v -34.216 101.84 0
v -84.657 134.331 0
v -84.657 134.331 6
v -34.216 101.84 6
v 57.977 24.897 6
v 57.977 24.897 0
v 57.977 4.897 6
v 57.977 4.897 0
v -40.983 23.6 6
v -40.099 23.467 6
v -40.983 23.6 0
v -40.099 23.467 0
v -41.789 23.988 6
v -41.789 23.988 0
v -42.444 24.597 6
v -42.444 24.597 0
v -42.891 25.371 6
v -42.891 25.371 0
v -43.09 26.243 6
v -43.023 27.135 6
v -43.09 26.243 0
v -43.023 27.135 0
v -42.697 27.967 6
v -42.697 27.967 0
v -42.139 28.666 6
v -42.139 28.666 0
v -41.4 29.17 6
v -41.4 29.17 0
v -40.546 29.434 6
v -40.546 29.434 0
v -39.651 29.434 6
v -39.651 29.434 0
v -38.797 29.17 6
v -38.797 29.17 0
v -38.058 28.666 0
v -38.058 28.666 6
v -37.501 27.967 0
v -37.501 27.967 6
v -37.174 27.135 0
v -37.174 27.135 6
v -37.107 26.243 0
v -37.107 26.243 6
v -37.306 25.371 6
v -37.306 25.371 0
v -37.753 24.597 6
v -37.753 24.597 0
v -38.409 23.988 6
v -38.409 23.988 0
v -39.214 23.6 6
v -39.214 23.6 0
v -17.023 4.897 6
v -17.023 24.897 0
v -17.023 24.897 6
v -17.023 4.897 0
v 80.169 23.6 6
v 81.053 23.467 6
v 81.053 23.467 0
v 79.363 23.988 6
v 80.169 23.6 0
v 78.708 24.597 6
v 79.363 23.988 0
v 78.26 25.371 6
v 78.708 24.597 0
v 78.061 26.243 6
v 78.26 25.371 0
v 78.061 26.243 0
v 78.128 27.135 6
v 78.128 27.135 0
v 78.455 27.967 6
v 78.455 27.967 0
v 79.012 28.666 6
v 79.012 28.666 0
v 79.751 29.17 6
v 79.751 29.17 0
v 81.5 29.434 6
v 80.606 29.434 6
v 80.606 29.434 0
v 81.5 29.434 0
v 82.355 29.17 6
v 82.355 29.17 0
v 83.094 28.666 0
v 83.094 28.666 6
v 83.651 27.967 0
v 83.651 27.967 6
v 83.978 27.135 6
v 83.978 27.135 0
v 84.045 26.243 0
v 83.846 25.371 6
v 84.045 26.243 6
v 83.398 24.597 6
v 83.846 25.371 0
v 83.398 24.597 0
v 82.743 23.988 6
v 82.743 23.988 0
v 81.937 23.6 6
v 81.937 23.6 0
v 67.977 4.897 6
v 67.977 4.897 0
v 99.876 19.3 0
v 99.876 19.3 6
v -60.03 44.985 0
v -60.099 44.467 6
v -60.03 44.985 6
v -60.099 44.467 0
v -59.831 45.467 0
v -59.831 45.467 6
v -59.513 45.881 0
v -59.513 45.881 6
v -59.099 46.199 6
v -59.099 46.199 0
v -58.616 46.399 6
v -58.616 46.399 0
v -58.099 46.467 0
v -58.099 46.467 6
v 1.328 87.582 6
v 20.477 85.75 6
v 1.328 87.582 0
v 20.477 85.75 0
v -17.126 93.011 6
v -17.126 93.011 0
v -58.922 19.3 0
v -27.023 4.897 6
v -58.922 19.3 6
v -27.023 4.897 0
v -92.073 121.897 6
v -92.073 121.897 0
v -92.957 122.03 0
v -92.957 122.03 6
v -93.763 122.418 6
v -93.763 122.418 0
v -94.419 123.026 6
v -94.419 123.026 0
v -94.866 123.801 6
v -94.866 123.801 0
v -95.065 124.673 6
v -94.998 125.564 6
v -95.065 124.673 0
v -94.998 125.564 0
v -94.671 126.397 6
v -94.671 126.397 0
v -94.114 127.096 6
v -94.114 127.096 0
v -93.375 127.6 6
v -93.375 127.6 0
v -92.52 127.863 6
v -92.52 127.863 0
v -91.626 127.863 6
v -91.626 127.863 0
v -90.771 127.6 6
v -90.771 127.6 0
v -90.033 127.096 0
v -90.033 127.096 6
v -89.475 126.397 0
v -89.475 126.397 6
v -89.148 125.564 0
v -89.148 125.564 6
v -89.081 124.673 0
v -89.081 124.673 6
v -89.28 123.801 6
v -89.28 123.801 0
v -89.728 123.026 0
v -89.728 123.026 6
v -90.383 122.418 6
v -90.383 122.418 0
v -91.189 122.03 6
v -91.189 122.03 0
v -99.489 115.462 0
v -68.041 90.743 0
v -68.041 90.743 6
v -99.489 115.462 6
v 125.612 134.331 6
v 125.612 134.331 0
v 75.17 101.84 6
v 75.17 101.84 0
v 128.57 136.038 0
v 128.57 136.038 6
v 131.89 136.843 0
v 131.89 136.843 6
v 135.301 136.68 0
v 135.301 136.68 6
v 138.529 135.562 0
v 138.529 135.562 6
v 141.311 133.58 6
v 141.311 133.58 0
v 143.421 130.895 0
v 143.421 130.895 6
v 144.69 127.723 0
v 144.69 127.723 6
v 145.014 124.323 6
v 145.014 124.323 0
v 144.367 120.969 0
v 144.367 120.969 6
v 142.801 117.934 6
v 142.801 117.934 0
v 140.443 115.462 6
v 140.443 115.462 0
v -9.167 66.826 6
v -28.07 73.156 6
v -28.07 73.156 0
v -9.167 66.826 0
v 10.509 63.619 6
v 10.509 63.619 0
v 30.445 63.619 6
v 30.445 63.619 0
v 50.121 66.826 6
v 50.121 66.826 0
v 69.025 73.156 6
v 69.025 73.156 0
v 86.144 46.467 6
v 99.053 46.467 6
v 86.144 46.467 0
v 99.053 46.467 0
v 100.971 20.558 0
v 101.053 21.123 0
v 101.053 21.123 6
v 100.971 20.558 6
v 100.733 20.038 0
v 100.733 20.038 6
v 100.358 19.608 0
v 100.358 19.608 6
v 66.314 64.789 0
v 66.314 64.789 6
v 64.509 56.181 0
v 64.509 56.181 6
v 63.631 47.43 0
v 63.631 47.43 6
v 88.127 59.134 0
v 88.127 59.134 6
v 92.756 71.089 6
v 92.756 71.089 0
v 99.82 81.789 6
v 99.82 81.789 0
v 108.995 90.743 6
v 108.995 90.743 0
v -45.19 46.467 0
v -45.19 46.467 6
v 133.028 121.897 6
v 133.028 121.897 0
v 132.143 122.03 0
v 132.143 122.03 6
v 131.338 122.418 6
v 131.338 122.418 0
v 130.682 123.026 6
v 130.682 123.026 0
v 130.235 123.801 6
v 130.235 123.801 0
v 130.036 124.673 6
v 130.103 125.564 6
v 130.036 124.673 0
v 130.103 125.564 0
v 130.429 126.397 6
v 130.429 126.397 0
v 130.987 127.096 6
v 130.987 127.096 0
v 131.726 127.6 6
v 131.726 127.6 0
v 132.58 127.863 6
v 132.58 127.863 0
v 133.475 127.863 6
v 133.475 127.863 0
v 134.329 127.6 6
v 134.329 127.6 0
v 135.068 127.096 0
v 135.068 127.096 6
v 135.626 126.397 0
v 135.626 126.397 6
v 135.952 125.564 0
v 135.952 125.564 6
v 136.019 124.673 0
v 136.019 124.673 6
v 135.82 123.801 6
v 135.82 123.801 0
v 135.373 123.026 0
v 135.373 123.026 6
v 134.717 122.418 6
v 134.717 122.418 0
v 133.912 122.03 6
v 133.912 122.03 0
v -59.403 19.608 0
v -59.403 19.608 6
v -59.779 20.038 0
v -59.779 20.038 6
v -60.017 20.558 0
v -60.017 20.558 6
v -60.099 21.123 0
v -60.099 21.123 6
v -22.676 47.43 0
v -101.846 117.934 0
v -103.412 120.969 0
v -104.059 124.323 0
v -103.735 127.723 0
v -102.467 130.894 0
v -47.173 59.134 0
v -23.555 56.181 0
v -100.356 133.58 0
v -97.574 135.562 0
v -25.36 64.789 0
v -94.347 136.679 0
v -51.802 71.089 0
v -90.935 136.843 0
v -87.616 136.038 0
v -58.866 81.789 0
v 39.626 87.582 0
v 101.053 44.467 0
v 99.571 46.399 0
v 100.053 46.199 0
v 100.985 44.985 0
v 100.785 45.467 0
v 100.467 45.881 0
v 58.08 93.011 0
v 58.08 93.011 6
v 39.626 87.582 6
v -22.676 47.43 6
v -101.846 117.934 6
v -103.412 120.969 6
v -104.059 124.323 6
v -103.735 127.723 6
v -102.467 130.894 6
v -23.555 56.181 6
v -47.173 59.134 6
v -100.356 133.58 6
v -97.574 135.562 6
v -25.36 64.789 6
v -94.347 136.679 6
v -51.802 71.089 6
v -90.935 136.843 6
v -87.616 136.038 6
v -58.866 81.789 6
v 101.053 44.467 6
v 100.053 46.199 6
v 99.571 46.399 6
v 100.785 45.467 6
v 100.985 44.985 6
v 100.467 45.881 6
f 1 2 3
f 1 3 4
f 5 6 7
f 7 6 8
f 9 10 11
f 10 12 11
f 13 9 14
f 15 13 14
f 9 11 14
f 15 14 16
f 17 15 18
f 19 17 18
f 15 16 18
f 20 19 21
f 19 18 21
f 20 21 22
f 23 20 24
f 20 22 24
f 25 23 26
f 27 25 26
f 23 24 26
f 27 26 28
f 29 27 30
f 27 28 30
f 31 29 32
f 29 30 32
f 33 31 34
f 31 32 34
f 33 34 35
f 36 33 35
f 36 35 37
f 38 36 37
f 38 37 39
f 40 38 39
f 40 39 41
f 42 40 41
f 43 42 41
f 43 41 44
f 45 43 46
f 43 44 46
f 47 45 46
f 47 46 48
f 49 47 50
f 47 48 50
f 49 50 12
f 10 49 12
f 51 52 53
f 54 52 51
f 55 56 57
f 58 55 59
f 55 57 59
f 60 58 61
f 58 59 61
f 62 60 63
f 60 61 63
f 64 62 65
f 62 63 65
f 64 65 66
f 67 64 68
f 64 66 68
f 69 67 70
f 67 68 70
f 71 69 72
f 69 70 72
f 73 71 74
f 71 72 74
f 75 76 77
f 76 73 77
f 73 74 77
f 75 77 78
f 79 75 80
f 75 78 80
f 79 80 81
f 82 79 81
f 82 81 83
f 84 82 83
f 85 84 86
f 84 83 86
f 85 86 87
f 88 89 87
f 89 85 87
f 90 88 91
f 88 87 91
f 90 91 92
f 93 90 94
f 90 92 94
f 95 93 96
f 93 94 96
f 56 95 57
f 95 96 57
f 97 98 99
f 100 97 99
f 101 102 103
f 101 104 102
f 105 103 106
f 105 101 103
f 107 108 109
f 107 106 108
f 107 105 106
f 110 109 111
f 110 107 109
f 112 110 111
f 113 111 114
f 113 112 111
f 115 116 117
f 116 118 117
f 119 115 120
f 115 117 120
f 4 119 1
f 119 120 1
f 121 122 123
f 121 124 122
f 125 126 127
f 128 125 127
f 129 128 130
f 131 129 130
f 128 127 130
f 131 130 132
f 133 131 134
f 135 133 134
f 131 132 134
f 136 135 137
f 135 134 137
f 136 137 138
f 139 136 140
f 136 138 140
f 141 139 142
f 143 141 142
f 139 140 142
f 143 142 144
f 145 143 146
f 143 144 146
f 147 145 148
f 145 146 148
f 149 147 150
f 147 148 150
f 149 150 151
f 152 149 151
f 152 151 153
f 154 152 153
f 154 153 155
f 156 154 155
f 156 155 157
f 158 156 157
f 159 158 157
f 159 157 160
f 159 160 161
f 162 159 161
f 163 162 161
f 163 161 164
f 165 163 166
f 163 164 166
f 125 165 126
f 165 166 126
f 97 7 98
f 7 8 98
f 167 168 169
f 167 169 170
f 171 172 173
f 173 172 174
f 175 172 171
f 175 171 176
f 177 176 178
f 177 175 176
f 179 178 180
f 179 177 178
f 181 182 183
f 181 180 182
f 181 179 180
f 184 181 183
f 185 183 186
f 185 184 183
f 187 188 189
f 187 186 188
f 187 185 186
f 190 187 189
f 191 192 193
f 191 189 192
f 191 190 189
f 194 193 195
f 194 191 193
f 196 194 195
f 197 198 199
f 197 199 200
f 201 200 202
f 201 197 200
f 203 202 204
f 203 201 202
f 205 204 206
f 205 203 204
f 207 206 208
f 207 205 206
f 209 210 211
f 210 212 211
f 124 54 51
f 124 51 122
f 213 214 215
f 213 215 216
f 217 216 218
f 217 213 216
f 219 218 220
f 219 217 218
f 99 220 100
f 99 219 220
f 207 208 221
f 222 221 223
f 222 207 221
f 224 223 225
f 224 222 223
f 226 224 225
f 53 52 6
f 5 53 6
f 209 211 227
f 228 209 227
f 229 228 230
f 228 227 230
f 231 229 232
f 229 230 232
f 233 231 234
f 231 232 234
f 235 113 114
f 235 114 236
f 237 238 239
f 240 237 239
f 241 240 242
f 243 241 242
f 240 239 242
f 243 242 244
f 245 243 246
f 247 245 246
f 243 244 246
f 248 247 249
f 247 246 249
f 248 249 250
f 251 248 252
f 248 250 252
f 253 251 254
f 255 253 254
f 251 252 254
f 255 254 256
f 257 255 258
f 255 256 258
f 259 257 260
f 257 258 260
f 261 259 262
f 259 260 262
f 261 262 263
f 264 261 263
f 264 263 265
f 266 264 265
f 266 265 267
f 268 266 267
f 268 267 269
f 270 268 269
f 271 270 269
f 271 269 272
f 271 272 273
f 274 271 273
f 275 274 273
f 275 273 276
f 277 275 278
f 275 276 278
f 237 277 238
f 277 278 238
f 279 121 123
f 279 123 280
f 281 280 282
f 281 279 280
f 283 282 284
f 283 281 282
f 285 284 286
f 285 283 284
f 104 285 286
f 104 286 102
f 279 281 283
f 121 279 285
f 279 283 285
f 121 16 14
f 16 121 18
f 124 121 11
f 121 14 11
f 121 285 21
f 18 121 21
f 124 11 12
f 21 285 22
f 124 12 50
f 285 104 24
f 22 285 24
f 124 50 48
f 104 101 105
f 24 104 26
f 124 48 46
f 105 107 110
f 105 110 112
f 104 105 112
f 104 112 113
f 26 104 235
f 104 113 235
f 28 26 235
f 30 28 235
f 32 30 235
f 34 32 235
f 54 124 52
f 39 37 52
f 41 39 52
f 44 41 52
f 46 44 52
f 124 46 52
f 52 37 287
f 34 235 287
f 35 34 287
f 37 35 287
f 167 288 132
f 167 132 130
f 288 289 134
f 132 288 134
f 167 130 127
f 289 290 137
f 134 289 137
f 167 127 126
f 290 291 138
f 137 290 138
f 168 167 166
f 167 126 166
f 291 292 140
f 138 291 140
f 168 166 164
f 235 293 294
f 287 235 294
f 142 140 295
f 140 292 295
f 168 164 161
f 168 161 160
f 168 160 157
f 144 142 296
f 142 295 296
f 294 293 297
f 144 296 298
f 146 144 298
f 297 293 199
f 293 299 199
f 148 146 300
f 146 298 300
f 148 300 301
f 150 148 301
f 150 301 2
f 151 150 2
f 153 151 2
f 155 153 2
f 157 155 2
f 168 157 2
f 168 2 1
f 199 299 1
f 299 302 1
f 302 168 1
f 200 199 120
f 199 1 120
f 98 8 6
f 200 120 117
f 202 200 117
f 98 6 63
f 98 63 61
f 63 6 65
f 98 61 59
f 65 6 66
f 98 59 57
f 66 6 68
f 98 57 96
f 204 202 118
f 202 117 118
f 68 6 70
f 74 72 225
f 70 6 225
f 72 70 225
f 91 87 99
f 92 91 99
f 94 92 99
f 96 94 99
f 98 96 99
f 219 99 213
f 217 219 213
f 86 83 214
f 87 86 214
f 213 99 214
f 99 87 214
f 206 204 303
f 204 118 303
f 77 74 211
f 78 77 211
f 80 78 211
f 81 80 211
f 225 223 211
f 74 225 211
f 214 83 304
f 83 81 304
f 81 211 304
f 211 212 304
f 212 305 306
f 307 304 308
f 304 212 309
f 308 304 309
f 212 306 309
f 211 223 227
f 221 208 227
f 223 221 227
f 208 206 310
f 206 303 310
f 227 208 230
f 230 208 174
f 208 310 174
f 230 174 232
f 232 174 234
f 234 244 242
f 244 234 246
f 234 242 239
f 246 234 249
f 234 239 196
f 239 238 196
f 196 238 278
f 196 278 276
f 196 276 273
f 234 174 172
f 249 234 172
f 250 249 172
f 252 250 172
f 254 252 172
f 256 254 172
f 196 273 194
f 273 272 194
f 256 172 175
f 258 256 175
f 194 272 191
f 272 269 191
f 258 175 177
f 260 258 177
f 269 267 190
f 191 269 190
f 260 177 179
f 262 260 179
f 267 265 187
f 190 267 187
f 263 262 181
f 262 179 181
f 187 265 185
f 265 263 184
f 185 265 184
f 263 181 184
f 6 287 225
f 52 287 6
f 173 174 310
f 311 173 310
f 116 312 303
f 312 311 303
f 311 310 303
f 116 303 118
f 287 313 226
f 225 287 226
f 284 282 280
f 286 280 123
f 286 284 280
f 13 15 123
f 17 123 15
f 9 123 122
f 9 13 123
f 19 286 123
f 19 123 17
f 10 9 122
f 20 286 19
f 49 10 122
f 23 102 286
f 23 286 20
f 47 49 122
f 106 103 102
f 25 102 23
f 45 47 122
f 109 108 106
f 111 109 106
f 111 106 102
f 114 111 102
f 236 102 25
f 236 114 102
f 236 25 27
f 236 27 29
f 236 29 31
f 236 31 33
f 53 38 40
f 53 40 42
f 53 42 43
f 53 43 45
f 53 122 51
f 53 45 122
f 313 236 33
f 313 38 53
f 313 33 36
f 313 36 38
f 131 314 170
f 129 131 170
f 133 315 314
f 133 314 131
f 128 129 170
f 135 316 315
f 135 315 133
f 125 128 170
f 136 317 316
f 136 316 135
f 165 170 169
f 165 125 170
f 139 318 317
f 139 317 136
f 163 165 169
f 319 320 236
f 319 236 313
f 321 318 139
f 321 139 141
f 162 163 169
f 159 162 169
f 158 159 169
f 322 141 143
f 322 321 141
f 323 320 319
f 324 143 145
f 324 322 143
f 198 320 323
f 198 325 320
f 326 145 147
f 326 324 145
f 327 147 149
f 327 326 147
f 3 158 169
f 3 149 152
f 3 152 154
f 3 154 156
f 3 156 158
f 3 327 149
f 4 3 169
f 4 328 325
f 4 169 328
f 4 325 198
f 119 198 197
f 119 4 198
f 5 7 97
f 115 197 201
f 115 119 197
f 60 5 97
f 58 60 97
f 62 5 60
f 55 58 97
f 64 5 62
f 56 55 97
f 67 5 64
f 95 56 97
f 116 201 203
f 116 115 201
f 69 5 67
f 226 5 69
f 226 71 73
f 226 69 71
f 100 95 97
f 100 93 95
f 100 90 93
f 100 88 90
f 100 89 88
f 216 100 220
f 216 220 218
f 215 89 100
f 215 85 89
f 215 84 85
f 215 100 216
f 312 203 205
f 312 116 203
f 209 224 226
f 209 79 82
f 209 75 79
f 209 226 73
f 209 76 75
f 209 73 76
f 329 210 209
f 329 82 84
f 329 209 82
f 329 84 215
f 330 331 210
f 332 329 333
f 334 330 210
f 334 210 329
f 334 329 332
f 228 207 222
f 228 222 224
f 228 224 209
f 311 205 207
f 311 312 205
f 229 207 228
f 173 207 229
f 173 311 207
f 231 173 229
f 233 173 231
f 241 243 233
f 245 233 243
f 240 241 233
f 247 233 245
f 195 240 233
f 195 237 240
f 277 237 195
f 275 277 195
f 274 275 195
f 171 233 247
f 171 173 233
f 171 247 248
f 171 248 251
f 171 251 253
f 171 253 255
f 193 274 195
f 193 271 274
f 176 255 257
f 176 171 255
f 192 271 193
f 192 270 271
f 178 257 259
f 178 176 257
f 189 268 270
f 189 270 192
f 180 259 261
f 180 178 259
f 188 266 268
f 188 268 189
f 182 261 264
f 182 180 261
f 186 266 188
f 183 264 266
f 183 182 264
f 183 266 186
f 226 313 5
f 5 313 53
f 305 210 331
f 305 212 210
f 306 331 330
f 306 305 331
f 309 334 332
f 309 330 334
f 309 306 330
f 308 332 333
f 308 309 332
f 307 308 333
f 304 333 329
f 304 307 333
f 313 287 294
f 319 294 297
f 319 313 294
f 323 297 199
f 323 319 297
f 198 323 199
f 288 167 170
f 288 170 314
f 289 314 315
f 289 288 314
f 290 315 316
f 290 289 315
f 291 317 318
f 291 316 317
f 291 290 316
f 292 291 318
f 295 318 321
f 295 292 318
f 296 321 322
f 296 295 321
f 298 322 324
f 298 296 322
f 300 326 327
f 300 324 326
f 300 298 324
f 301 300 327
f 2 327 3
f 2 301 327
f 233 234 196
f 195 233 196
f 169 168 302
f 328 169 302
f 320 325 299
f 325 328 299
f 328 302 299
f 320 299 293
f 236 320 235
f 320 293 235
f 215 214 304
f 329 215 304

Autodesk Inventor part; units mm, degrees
ref_plane "YZ Plane" through (0, 0, 0) normal (1, 0, 0) x (0, 1, 0)
ref_plane "XZ Plane" through (0, 0, 0) normal (0, 1, 0) x (-1, 0, 0)
sketch "Boceto1" plane through (0, 0, 0) normal (0, 0, 1) x (1, 0, 0)
  line L0 (20.4772, 24.8969) -> (57.9772, 24.8969)
  line L1 (86.0741, 43.5717) -> (86.0741, 43.5717)
  arc A0 (108.9954, 90.7434) -> (86.144, 46.4672) centre (146.0741, 43.5717) ccw
  arc A1 (20.4772, 85.7499) -> (75.1704, 101.8402) centre (20.4772, 186.7499) ccw
  line L2 (108.9954, 90.7434) -> (140.4433, 115.4625)
  arc A2 (140.4433, 115.4625) -> (125.6118, 134.3312) centre (133.0275, 124.8969) ccw
  line L3 (125.6118, 134.3312) -> (75.1704, 101.8402)
  line L4 (57.9772, 24.8969) -> (57.9772, 4.8969)
  line L5 (57.9772, 4.8969) -> (67.9772, 4.8969)
  line L6 (67.9772, 4.8969) -> (99.8761, 19.3004)
  line L7 (101.053, 21.1232) -> (101.053, 44.4672)
  line L8 (99.053, 46.4672) -> (86.144, 46.4672)
  line L9 (20.4772, -46.5022) -> (20.4772, 138.2428)
  arc A3 (101.053, 44.4672) -> (99.053, 46.4672) centre (99.053, 44.4672) ccw
  arc A4 (99.8761, 19.3004) -> (101.053, 21.1232) centre (99.053, 21.1232) ccw
  line L10 (20.4772, 24.8969) -> (-17.0228, 24.8969)
  line L11 (-45.1197, 43.5717) -> (-45.1197, 43.5717)
  arc A5 (-45.1896, 46.4672) -> (-68.041, 90.7434) centre (-105.1197, 43.5717) ccw
  arc A6 (-34.216, 101.8402) -> (20.4772, 85.7499) centre (20.4772, 186.7499) ccw
  line L12 (-68.041, 90.7434) -> (-99.4888, 115.4625)
  arc A7 (-84.6574, 134.3312) -> (-99.4888, 115.4625) centre (-92.0731, 124.8969) ccw
  line L13 (-84.6574, 134.3312) -> (-34.216, 101.8402)
  line L14 (-17.0228, 24.8969) -> (-17.0228, 4.8969)
  line L15 (-17.0228, 4.8969) -> (-27.0228, 4.8969)
  line L16 (-27.0228, 4.8969) -> (-58.9217, 19.3004)
  line L17 (-60.0986, 21.1232) -> (-60.0986, 44.4672)
  line L18 (-58.0986, 46.4672) -> (-45.1896, 46.4672)
  arc A8 (-58.0986, 46.4672) -> (-60.0986, 44.4672) centre (-58.0986, 44.4672) ccw
  arc A9 (-60.0986, 21.1232) -> (-58.9217, 19.3004) centre (-58.0986, 21.1232) ccw
  point P0 (0, 0)
  dimension "d0" = 37.5
  dimension "d1" = 60
  dimension "d3" = 40
  dimension "d4" = 12
  dimension "d5" = 60
  dimension "d6" = 101
  dimension "d7" = 2
  dimension "d21" = 10
  dimension "d23" = 35
  dimension "d42" = 100
  dimension "d43" = 20
extrude "Extrusión1" add sketch "Boceto1" along normal blind 6
hole "Agujero1" at (-40.0986, 26.4672, 6) direction (0, 0, -1) diameter 6 end through all
ref_plane "Plano de trabajo1" through (20.4772, 21.1232, 0) normal (-1, 0, 0) x (0, 0, 1)
mirror "Simetría1" about plane through (20.4772, 21.1232, 0) normal (-1, 0, 0) of "Agujero1"
hole "Agujero2" at (-92.0731, 124.8969, 6) direction (0, 0, -1) diameter 6 end through all
hole "Agujero3" at (133.0275, 124.8969, 6) direction (0, 0, -1) diameter 6 end through all
sketch "Boceto3" plane through (0, 0, 6) normal (0, 0, 1) x (1, 0, 0)
  circle A0 centre (133.0275, 124.8969) radius 3 projected
  circle A1 centre (-92.0731, 124.8969) radius 3 projected
  circle A2 centre (81.053, 26.4672) radius 3 projected
  circle A3 centre (-40.0986, 26.4672) radius 3 projected
  arc A4 (-34.216, 101.8402) -> (75.1704, 101.8402) centre (20.4772, 186.7499) ccw projected
  line L0 (-34.216, 101.8402) -> (-84.6574, 134.3312) projected
  arc A5 (-84.6574, 134.3312) -> (-99.4888, 115.4625) centre (-92.0731, 124.8969) ccw projected
  line L1 (-99.4888, 115.4625) -> (-68.041, 90.7434) projected
  arc A6 (-45.1896, 46.4672) -> (-68.041, 90.7434) centre (-105.1197, 43.5717) ccw projected
  line L2 (-45.1896, 46.4672) -> (-58.0986, 46.4672) projected
  arc A7 (-58.0986, 46.4672) -> (-60.0986, 44.4672) centre (-58.0986, 44.4672) ccw projected
  line L3 (-60.0986, 44.4672) -> (-60.0986, 21.1232) projected
  arc A8 (-60.0986, 21.1232) -> (-58.9217, 19.3004) centre (-58.0986, 21.1232) ccw projected
  line L4 (-58.9217, 19.3004) -> (-27.0228, 4.8969) projected
  line L5 (-27.0228, 4.8969) -> (-17.0228, 4.8969) projected
  line L6 (-17.0228, 4.8969) -> (-17.0228, 24.8969) projected
  line L7 (-17.0228, 24.8969) -> (57.9772, 24.8969) projected
  line L8 (57.9772, 24.8969) -> (57.9772, 4.8969) projected
  line L9 (57.9772, 4.8969) -> (67.9772, 4.8969) projected
  line L10 (67.9772, 4.8969) -> (99.8761, 19.3004) projected
  arc A9 (99.8761, 19.3004) -> (101.053, 21.1232) centre (99.053, 21.1232) ccw projected
  line L11 (101.053, 21.1232) -> (101.053, 44.4672) projected
  arc A10 (101.053, 44.4672) -> (99.053, 46.4672) centre (99.053, 44.4672) ccw projected
  line L12 (99.053, 46.4672) -> (86.144, 46.4672) projected
  arc A11 (108.9954, 90.7434) -> (86.144, 46.4672) centre (146.0741, 43.5717) ccw projected
  line L13 (108.9954, 90.7434) -> (140.4433, 115.4625) projected
  arc A12 (140.4433, 115.4625) -> (125.6118, 134.3312) centre (133.0275, 124.8969) ccw projected
  line L14 (125.6118, 134.3312) -> (75.1704, 101.8402) projected
  arc A13 (-28.0705, 73.1557) -> (69.0249, 73.1557) centre (20.4772, 186.7499) ccw
  arc A14 (-22.6764, 47.4304) -> (-28.0705, 73.1557) centre (-105.1197, 43.5717) ccw
  line L15 (-22.6764, 47.4304) -> (63.6308, 47.4304)
  arc A15 (69.0249, 73.1557) -> (63.6308, 47.4304) centre (146.0741, 43.5717) ccw
  point P0 (0, 0)
extrude "Extrusión3" cut sketch "Boceto3" against normal through all contours A13 A15 L15 A14
properties part number "back_plate"
